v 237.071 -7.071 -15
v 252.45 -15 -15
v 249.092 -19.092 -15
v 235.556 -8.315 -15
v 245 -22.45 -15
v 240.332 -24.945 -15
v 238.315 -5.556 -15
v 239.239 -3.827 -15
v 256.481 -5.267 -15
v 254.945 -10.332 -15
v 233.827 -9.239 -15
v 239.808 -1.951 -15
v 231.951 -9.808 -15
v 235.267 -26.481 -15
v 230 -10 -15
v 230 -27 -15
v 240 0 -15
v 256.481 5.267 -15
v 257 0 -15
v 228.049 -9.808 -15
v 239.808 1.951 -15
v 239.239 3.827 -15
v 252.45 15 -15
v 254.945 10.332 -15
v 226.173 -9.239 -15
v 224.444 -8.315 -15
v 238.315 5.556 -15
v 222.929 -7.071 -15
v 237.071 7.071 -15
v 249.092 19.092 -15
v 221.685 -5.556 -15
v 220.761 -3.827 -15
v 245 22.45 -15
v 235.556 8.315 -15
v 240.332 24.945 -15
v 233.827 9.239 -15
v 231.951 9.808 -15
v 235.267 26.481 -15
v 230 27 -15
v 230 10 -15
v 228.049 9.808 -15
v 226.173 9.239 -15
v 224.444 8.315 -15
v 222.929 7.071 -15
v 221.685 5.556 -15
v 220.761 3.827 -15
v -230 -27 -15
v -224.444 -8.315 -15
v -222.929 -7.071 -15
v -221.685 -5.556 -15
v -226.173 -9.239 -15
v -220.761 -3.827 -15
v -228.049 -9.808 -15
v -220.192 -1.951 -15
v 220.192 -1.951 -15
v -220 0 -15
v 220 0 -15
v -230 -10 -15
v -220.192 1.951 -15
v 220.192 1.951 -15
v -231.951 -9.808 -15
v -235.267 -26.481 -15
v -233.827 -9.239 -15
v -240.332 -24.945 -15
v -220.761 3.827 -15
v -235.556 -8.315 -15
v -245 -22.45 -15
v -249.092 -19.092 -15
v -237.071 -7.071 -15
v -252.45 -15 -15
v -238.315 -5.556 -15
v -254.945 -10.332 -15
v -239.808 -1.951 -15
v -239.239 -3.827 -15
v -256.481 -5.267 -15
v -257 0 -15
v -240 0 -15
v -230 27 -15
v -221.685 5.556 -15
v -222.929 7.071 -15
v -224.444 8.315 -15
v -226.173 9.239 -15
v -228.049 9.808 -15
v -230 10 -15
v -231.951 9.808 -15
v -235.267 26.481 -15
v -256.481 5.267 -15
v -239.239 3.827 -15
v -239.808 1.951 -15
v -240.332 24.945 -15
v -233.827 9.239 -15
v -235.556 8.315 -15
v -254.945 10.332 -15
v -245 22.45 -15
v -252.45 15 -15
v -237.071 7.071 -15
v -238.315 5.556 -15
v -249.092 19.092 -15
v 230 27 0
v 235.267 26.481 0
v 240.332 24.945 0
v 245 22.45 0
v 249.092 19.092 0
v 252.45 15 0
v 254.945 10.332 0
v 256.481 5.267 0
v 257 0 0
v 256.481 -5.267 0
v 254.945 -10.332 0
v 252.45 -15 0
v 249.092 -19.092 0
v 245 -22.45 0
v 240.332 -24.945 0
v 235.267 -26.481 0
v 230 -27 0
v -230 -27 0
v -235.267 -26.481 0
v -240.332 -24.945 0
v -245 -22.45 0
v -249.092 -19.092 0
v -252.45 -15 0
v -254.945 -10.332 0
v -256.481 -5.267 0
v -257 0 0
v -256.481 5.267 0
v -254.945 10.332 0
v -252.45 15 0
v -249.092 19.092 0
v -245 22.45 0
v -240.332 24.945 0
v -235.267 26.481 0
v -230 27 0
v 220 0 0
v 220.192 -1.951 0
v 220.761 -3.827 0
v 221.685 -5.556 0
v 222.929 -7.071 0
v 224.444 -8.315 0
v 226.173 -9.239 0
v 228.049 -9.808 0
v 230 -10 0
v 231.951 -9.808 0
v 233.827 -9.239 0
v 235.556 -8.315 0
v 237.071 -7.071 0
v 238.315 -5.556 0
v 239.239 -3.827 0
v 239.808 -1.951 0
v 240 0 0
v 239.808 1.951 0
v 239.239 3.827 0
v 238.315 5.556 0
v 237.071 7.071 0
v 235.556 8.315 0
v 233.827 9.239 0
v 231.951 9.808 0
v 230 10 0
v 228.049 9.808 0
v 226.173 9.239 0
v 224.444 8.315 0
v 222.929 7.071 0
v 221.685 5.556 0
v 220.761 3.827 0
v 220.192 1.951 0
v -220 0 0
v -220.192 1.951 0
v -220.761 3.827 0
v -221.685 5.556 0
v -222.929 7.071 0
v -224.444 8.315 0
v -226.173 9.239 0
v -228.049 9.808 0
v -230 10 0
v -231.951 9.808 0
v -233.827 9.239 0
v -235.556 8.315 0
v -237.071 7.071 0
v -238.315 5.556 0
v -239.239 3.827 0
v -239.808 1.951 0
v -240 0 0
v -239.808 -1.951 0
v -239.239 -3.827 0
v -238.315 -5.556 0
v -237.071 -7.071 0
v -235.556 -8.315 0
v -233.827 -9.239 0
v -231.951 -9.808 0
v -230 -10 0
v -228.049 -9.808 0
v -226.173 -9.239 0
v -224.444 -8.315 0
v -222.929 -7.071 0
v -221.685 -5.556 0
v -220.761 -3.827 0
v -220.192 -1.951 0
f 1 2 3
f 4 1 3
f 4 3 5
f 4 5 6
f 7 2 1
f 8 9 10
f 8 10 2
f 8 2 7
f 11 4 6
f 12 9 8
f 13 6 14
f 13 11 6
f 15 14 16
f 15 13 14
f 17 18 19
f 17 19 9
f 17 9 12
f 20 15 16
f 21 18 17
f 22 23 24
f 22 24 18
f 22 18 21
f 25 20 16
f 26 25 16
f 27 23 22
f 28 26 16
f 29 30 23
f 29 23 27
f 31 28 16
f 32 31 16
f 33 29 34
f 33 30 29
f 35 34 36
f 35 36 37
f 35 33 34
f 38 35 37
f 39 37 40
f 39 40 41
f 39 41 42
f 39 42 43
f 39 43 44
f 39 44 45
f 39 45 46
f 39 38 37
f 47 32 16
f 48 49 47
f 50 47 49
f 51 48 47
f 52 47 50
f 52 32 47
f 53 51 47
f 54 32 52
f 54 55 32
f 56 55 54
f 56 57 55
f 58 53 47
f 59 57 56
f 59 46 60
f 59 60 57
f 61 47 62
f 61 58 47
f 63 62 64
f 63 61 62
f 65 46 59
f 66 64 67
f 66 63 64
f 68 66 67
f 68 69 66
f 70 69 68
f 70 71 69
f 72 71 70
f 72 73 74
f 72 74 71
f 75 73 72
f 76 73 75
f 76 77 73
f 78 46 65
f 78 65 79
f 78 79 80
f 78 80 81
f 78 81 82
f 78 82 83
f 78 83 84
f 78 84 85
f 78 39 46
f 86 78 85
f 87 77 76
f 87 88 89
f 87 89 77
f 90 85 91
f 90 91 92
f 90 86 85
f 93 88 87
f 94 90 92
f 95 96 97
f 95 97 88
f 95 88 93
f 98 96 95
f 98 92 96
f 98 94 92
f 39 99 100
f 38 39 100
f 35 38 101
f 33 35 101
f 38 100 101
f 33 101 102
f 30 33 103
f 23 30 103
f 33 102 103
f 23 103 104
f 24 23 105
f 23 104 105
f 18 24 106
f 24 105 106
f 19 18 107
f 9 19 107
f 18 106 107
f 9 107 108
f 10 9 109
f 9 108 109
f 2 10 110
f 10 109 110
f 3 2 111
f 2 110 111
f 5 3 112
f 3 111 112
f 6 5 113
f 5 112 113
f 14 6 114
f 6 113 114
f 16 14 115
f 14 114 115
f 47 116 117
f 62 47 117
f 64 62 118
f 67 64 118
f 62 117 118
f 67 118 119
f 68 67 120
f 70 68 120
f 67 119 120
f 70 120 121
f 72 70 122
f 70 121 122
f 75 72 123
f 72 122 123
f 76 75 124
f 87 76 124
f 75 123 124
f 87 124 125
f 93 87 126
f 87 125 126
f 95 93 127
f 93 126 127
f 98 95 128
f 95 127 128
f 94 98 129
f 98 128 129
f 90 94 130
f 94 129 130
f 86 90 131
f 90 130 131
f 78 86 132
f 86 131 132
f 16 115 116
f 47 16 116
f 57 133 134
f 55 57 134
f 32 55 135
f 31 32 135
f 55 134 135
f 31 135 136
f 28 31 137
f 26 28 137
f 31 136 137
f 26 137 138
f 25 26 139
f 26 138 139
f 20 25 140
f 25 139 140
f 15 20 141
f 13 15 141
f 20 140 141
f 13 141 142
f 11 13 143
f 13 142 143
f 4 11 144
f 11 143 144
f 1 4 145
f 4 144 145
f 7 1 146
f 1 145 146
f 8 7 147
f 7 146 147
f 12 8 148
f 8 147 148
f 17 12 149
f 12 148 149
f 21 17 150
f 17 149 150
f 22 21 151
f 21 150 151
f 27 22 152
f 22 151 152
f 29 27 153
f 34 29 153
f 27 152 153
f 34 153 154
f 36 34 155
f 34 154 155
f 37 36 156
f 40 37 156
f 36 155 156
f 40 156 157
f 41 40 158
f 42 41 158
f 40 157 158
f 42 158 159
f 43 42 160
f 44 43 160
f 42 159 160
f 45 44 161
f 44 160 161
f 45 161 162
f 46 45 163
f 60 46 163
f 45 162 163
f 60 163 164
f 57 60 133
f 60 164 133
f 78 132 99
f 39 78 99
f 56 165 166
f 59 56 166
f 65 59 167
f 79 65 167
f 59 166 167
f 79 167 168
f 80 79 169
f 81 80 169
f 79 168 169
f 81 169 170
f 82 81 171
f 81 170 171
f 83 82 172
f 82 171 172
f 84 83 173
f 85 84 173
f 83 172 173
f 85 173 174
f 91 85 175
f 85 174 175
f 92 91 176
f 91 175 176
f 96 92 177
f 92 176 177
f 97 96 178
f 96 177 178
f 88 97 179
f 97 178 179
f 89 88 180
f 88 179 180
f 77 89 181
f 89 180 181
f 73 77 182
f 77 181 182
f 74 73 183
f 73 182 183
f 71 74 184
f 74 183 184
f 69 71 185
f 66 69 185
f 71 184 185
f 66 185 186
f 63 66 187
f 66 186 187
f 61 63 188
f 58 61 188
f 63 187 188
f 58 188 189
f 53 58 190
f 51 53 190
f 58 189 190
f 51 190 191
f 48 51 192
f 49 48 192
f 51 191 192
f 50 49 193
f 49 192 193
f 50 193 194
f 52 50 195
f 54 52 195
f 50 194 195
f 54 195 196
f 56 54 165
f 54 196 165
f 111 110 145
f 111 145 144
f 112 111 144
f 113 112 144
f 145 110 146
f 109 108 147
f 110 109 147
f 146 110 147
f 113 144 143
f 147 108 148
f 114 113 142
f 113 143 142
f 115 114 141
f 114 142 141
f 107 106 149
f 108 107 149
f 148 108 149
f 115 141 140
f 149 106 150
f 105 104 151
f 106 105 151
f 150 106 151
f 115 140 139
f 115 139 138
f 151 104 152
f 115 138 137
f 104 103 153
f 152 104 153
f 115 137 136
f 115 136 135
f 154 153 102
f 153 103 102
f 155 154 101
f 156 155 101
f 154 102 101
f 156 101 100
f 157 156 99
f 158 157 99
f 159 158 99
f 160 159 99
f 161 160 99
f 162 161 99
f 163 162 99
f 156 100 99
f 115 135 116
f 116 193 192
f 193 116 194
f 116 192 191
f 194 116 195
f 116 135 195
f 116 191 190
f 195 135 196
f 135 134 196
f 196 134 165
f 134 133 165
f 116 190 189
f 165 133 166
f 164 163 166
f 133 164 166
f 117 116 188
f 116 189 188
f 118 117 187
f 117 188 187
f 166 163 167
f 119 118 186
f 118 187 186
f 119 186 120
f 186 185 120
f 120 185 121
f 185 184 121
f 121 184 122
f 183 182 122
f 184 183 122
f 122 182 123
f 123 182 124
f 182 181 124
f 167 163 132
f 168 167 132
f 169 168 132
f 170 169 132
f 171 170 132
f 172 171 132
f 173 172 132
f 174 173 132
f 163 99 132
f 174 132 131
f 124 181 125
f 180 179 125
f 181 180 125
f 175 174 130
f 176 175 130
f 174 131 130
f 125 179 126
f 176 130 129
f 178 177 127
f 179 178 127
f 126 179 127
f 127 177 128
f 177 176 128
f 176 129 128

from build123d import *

# Parameters (mm, degrees)
SKETCH2_R           = 10
BOSS_EXTRUDE2_DEPTH = 15


with BuildPart() as part:
    # Sketch2 → Boss-Extrude2 (new body)
    with BuildSketch(Plane.XY):
        with BuildLine():
            Line((-230, 27), (230, 27))
            ThreePointArc((230, 27), (257, 0), (230, -27))
            Line((230, -27), (-230, -27))
            ThreePointArc((-230, -27), (-257, 0), (-230, 27))
        make_face()
        with Locations((-230, 0)):
            Circle(SKETCH2_R, mode=Mode.SUBTRACT)
        with Locations(Location((230, 0, 0), (0, 0, 180))):
            Circle(SKETCH2_R, mode=Mode.SUBTRACT)
    extrude(amount=-BOSS_EXTRUDE2_DEPTH)


solid = part.part
